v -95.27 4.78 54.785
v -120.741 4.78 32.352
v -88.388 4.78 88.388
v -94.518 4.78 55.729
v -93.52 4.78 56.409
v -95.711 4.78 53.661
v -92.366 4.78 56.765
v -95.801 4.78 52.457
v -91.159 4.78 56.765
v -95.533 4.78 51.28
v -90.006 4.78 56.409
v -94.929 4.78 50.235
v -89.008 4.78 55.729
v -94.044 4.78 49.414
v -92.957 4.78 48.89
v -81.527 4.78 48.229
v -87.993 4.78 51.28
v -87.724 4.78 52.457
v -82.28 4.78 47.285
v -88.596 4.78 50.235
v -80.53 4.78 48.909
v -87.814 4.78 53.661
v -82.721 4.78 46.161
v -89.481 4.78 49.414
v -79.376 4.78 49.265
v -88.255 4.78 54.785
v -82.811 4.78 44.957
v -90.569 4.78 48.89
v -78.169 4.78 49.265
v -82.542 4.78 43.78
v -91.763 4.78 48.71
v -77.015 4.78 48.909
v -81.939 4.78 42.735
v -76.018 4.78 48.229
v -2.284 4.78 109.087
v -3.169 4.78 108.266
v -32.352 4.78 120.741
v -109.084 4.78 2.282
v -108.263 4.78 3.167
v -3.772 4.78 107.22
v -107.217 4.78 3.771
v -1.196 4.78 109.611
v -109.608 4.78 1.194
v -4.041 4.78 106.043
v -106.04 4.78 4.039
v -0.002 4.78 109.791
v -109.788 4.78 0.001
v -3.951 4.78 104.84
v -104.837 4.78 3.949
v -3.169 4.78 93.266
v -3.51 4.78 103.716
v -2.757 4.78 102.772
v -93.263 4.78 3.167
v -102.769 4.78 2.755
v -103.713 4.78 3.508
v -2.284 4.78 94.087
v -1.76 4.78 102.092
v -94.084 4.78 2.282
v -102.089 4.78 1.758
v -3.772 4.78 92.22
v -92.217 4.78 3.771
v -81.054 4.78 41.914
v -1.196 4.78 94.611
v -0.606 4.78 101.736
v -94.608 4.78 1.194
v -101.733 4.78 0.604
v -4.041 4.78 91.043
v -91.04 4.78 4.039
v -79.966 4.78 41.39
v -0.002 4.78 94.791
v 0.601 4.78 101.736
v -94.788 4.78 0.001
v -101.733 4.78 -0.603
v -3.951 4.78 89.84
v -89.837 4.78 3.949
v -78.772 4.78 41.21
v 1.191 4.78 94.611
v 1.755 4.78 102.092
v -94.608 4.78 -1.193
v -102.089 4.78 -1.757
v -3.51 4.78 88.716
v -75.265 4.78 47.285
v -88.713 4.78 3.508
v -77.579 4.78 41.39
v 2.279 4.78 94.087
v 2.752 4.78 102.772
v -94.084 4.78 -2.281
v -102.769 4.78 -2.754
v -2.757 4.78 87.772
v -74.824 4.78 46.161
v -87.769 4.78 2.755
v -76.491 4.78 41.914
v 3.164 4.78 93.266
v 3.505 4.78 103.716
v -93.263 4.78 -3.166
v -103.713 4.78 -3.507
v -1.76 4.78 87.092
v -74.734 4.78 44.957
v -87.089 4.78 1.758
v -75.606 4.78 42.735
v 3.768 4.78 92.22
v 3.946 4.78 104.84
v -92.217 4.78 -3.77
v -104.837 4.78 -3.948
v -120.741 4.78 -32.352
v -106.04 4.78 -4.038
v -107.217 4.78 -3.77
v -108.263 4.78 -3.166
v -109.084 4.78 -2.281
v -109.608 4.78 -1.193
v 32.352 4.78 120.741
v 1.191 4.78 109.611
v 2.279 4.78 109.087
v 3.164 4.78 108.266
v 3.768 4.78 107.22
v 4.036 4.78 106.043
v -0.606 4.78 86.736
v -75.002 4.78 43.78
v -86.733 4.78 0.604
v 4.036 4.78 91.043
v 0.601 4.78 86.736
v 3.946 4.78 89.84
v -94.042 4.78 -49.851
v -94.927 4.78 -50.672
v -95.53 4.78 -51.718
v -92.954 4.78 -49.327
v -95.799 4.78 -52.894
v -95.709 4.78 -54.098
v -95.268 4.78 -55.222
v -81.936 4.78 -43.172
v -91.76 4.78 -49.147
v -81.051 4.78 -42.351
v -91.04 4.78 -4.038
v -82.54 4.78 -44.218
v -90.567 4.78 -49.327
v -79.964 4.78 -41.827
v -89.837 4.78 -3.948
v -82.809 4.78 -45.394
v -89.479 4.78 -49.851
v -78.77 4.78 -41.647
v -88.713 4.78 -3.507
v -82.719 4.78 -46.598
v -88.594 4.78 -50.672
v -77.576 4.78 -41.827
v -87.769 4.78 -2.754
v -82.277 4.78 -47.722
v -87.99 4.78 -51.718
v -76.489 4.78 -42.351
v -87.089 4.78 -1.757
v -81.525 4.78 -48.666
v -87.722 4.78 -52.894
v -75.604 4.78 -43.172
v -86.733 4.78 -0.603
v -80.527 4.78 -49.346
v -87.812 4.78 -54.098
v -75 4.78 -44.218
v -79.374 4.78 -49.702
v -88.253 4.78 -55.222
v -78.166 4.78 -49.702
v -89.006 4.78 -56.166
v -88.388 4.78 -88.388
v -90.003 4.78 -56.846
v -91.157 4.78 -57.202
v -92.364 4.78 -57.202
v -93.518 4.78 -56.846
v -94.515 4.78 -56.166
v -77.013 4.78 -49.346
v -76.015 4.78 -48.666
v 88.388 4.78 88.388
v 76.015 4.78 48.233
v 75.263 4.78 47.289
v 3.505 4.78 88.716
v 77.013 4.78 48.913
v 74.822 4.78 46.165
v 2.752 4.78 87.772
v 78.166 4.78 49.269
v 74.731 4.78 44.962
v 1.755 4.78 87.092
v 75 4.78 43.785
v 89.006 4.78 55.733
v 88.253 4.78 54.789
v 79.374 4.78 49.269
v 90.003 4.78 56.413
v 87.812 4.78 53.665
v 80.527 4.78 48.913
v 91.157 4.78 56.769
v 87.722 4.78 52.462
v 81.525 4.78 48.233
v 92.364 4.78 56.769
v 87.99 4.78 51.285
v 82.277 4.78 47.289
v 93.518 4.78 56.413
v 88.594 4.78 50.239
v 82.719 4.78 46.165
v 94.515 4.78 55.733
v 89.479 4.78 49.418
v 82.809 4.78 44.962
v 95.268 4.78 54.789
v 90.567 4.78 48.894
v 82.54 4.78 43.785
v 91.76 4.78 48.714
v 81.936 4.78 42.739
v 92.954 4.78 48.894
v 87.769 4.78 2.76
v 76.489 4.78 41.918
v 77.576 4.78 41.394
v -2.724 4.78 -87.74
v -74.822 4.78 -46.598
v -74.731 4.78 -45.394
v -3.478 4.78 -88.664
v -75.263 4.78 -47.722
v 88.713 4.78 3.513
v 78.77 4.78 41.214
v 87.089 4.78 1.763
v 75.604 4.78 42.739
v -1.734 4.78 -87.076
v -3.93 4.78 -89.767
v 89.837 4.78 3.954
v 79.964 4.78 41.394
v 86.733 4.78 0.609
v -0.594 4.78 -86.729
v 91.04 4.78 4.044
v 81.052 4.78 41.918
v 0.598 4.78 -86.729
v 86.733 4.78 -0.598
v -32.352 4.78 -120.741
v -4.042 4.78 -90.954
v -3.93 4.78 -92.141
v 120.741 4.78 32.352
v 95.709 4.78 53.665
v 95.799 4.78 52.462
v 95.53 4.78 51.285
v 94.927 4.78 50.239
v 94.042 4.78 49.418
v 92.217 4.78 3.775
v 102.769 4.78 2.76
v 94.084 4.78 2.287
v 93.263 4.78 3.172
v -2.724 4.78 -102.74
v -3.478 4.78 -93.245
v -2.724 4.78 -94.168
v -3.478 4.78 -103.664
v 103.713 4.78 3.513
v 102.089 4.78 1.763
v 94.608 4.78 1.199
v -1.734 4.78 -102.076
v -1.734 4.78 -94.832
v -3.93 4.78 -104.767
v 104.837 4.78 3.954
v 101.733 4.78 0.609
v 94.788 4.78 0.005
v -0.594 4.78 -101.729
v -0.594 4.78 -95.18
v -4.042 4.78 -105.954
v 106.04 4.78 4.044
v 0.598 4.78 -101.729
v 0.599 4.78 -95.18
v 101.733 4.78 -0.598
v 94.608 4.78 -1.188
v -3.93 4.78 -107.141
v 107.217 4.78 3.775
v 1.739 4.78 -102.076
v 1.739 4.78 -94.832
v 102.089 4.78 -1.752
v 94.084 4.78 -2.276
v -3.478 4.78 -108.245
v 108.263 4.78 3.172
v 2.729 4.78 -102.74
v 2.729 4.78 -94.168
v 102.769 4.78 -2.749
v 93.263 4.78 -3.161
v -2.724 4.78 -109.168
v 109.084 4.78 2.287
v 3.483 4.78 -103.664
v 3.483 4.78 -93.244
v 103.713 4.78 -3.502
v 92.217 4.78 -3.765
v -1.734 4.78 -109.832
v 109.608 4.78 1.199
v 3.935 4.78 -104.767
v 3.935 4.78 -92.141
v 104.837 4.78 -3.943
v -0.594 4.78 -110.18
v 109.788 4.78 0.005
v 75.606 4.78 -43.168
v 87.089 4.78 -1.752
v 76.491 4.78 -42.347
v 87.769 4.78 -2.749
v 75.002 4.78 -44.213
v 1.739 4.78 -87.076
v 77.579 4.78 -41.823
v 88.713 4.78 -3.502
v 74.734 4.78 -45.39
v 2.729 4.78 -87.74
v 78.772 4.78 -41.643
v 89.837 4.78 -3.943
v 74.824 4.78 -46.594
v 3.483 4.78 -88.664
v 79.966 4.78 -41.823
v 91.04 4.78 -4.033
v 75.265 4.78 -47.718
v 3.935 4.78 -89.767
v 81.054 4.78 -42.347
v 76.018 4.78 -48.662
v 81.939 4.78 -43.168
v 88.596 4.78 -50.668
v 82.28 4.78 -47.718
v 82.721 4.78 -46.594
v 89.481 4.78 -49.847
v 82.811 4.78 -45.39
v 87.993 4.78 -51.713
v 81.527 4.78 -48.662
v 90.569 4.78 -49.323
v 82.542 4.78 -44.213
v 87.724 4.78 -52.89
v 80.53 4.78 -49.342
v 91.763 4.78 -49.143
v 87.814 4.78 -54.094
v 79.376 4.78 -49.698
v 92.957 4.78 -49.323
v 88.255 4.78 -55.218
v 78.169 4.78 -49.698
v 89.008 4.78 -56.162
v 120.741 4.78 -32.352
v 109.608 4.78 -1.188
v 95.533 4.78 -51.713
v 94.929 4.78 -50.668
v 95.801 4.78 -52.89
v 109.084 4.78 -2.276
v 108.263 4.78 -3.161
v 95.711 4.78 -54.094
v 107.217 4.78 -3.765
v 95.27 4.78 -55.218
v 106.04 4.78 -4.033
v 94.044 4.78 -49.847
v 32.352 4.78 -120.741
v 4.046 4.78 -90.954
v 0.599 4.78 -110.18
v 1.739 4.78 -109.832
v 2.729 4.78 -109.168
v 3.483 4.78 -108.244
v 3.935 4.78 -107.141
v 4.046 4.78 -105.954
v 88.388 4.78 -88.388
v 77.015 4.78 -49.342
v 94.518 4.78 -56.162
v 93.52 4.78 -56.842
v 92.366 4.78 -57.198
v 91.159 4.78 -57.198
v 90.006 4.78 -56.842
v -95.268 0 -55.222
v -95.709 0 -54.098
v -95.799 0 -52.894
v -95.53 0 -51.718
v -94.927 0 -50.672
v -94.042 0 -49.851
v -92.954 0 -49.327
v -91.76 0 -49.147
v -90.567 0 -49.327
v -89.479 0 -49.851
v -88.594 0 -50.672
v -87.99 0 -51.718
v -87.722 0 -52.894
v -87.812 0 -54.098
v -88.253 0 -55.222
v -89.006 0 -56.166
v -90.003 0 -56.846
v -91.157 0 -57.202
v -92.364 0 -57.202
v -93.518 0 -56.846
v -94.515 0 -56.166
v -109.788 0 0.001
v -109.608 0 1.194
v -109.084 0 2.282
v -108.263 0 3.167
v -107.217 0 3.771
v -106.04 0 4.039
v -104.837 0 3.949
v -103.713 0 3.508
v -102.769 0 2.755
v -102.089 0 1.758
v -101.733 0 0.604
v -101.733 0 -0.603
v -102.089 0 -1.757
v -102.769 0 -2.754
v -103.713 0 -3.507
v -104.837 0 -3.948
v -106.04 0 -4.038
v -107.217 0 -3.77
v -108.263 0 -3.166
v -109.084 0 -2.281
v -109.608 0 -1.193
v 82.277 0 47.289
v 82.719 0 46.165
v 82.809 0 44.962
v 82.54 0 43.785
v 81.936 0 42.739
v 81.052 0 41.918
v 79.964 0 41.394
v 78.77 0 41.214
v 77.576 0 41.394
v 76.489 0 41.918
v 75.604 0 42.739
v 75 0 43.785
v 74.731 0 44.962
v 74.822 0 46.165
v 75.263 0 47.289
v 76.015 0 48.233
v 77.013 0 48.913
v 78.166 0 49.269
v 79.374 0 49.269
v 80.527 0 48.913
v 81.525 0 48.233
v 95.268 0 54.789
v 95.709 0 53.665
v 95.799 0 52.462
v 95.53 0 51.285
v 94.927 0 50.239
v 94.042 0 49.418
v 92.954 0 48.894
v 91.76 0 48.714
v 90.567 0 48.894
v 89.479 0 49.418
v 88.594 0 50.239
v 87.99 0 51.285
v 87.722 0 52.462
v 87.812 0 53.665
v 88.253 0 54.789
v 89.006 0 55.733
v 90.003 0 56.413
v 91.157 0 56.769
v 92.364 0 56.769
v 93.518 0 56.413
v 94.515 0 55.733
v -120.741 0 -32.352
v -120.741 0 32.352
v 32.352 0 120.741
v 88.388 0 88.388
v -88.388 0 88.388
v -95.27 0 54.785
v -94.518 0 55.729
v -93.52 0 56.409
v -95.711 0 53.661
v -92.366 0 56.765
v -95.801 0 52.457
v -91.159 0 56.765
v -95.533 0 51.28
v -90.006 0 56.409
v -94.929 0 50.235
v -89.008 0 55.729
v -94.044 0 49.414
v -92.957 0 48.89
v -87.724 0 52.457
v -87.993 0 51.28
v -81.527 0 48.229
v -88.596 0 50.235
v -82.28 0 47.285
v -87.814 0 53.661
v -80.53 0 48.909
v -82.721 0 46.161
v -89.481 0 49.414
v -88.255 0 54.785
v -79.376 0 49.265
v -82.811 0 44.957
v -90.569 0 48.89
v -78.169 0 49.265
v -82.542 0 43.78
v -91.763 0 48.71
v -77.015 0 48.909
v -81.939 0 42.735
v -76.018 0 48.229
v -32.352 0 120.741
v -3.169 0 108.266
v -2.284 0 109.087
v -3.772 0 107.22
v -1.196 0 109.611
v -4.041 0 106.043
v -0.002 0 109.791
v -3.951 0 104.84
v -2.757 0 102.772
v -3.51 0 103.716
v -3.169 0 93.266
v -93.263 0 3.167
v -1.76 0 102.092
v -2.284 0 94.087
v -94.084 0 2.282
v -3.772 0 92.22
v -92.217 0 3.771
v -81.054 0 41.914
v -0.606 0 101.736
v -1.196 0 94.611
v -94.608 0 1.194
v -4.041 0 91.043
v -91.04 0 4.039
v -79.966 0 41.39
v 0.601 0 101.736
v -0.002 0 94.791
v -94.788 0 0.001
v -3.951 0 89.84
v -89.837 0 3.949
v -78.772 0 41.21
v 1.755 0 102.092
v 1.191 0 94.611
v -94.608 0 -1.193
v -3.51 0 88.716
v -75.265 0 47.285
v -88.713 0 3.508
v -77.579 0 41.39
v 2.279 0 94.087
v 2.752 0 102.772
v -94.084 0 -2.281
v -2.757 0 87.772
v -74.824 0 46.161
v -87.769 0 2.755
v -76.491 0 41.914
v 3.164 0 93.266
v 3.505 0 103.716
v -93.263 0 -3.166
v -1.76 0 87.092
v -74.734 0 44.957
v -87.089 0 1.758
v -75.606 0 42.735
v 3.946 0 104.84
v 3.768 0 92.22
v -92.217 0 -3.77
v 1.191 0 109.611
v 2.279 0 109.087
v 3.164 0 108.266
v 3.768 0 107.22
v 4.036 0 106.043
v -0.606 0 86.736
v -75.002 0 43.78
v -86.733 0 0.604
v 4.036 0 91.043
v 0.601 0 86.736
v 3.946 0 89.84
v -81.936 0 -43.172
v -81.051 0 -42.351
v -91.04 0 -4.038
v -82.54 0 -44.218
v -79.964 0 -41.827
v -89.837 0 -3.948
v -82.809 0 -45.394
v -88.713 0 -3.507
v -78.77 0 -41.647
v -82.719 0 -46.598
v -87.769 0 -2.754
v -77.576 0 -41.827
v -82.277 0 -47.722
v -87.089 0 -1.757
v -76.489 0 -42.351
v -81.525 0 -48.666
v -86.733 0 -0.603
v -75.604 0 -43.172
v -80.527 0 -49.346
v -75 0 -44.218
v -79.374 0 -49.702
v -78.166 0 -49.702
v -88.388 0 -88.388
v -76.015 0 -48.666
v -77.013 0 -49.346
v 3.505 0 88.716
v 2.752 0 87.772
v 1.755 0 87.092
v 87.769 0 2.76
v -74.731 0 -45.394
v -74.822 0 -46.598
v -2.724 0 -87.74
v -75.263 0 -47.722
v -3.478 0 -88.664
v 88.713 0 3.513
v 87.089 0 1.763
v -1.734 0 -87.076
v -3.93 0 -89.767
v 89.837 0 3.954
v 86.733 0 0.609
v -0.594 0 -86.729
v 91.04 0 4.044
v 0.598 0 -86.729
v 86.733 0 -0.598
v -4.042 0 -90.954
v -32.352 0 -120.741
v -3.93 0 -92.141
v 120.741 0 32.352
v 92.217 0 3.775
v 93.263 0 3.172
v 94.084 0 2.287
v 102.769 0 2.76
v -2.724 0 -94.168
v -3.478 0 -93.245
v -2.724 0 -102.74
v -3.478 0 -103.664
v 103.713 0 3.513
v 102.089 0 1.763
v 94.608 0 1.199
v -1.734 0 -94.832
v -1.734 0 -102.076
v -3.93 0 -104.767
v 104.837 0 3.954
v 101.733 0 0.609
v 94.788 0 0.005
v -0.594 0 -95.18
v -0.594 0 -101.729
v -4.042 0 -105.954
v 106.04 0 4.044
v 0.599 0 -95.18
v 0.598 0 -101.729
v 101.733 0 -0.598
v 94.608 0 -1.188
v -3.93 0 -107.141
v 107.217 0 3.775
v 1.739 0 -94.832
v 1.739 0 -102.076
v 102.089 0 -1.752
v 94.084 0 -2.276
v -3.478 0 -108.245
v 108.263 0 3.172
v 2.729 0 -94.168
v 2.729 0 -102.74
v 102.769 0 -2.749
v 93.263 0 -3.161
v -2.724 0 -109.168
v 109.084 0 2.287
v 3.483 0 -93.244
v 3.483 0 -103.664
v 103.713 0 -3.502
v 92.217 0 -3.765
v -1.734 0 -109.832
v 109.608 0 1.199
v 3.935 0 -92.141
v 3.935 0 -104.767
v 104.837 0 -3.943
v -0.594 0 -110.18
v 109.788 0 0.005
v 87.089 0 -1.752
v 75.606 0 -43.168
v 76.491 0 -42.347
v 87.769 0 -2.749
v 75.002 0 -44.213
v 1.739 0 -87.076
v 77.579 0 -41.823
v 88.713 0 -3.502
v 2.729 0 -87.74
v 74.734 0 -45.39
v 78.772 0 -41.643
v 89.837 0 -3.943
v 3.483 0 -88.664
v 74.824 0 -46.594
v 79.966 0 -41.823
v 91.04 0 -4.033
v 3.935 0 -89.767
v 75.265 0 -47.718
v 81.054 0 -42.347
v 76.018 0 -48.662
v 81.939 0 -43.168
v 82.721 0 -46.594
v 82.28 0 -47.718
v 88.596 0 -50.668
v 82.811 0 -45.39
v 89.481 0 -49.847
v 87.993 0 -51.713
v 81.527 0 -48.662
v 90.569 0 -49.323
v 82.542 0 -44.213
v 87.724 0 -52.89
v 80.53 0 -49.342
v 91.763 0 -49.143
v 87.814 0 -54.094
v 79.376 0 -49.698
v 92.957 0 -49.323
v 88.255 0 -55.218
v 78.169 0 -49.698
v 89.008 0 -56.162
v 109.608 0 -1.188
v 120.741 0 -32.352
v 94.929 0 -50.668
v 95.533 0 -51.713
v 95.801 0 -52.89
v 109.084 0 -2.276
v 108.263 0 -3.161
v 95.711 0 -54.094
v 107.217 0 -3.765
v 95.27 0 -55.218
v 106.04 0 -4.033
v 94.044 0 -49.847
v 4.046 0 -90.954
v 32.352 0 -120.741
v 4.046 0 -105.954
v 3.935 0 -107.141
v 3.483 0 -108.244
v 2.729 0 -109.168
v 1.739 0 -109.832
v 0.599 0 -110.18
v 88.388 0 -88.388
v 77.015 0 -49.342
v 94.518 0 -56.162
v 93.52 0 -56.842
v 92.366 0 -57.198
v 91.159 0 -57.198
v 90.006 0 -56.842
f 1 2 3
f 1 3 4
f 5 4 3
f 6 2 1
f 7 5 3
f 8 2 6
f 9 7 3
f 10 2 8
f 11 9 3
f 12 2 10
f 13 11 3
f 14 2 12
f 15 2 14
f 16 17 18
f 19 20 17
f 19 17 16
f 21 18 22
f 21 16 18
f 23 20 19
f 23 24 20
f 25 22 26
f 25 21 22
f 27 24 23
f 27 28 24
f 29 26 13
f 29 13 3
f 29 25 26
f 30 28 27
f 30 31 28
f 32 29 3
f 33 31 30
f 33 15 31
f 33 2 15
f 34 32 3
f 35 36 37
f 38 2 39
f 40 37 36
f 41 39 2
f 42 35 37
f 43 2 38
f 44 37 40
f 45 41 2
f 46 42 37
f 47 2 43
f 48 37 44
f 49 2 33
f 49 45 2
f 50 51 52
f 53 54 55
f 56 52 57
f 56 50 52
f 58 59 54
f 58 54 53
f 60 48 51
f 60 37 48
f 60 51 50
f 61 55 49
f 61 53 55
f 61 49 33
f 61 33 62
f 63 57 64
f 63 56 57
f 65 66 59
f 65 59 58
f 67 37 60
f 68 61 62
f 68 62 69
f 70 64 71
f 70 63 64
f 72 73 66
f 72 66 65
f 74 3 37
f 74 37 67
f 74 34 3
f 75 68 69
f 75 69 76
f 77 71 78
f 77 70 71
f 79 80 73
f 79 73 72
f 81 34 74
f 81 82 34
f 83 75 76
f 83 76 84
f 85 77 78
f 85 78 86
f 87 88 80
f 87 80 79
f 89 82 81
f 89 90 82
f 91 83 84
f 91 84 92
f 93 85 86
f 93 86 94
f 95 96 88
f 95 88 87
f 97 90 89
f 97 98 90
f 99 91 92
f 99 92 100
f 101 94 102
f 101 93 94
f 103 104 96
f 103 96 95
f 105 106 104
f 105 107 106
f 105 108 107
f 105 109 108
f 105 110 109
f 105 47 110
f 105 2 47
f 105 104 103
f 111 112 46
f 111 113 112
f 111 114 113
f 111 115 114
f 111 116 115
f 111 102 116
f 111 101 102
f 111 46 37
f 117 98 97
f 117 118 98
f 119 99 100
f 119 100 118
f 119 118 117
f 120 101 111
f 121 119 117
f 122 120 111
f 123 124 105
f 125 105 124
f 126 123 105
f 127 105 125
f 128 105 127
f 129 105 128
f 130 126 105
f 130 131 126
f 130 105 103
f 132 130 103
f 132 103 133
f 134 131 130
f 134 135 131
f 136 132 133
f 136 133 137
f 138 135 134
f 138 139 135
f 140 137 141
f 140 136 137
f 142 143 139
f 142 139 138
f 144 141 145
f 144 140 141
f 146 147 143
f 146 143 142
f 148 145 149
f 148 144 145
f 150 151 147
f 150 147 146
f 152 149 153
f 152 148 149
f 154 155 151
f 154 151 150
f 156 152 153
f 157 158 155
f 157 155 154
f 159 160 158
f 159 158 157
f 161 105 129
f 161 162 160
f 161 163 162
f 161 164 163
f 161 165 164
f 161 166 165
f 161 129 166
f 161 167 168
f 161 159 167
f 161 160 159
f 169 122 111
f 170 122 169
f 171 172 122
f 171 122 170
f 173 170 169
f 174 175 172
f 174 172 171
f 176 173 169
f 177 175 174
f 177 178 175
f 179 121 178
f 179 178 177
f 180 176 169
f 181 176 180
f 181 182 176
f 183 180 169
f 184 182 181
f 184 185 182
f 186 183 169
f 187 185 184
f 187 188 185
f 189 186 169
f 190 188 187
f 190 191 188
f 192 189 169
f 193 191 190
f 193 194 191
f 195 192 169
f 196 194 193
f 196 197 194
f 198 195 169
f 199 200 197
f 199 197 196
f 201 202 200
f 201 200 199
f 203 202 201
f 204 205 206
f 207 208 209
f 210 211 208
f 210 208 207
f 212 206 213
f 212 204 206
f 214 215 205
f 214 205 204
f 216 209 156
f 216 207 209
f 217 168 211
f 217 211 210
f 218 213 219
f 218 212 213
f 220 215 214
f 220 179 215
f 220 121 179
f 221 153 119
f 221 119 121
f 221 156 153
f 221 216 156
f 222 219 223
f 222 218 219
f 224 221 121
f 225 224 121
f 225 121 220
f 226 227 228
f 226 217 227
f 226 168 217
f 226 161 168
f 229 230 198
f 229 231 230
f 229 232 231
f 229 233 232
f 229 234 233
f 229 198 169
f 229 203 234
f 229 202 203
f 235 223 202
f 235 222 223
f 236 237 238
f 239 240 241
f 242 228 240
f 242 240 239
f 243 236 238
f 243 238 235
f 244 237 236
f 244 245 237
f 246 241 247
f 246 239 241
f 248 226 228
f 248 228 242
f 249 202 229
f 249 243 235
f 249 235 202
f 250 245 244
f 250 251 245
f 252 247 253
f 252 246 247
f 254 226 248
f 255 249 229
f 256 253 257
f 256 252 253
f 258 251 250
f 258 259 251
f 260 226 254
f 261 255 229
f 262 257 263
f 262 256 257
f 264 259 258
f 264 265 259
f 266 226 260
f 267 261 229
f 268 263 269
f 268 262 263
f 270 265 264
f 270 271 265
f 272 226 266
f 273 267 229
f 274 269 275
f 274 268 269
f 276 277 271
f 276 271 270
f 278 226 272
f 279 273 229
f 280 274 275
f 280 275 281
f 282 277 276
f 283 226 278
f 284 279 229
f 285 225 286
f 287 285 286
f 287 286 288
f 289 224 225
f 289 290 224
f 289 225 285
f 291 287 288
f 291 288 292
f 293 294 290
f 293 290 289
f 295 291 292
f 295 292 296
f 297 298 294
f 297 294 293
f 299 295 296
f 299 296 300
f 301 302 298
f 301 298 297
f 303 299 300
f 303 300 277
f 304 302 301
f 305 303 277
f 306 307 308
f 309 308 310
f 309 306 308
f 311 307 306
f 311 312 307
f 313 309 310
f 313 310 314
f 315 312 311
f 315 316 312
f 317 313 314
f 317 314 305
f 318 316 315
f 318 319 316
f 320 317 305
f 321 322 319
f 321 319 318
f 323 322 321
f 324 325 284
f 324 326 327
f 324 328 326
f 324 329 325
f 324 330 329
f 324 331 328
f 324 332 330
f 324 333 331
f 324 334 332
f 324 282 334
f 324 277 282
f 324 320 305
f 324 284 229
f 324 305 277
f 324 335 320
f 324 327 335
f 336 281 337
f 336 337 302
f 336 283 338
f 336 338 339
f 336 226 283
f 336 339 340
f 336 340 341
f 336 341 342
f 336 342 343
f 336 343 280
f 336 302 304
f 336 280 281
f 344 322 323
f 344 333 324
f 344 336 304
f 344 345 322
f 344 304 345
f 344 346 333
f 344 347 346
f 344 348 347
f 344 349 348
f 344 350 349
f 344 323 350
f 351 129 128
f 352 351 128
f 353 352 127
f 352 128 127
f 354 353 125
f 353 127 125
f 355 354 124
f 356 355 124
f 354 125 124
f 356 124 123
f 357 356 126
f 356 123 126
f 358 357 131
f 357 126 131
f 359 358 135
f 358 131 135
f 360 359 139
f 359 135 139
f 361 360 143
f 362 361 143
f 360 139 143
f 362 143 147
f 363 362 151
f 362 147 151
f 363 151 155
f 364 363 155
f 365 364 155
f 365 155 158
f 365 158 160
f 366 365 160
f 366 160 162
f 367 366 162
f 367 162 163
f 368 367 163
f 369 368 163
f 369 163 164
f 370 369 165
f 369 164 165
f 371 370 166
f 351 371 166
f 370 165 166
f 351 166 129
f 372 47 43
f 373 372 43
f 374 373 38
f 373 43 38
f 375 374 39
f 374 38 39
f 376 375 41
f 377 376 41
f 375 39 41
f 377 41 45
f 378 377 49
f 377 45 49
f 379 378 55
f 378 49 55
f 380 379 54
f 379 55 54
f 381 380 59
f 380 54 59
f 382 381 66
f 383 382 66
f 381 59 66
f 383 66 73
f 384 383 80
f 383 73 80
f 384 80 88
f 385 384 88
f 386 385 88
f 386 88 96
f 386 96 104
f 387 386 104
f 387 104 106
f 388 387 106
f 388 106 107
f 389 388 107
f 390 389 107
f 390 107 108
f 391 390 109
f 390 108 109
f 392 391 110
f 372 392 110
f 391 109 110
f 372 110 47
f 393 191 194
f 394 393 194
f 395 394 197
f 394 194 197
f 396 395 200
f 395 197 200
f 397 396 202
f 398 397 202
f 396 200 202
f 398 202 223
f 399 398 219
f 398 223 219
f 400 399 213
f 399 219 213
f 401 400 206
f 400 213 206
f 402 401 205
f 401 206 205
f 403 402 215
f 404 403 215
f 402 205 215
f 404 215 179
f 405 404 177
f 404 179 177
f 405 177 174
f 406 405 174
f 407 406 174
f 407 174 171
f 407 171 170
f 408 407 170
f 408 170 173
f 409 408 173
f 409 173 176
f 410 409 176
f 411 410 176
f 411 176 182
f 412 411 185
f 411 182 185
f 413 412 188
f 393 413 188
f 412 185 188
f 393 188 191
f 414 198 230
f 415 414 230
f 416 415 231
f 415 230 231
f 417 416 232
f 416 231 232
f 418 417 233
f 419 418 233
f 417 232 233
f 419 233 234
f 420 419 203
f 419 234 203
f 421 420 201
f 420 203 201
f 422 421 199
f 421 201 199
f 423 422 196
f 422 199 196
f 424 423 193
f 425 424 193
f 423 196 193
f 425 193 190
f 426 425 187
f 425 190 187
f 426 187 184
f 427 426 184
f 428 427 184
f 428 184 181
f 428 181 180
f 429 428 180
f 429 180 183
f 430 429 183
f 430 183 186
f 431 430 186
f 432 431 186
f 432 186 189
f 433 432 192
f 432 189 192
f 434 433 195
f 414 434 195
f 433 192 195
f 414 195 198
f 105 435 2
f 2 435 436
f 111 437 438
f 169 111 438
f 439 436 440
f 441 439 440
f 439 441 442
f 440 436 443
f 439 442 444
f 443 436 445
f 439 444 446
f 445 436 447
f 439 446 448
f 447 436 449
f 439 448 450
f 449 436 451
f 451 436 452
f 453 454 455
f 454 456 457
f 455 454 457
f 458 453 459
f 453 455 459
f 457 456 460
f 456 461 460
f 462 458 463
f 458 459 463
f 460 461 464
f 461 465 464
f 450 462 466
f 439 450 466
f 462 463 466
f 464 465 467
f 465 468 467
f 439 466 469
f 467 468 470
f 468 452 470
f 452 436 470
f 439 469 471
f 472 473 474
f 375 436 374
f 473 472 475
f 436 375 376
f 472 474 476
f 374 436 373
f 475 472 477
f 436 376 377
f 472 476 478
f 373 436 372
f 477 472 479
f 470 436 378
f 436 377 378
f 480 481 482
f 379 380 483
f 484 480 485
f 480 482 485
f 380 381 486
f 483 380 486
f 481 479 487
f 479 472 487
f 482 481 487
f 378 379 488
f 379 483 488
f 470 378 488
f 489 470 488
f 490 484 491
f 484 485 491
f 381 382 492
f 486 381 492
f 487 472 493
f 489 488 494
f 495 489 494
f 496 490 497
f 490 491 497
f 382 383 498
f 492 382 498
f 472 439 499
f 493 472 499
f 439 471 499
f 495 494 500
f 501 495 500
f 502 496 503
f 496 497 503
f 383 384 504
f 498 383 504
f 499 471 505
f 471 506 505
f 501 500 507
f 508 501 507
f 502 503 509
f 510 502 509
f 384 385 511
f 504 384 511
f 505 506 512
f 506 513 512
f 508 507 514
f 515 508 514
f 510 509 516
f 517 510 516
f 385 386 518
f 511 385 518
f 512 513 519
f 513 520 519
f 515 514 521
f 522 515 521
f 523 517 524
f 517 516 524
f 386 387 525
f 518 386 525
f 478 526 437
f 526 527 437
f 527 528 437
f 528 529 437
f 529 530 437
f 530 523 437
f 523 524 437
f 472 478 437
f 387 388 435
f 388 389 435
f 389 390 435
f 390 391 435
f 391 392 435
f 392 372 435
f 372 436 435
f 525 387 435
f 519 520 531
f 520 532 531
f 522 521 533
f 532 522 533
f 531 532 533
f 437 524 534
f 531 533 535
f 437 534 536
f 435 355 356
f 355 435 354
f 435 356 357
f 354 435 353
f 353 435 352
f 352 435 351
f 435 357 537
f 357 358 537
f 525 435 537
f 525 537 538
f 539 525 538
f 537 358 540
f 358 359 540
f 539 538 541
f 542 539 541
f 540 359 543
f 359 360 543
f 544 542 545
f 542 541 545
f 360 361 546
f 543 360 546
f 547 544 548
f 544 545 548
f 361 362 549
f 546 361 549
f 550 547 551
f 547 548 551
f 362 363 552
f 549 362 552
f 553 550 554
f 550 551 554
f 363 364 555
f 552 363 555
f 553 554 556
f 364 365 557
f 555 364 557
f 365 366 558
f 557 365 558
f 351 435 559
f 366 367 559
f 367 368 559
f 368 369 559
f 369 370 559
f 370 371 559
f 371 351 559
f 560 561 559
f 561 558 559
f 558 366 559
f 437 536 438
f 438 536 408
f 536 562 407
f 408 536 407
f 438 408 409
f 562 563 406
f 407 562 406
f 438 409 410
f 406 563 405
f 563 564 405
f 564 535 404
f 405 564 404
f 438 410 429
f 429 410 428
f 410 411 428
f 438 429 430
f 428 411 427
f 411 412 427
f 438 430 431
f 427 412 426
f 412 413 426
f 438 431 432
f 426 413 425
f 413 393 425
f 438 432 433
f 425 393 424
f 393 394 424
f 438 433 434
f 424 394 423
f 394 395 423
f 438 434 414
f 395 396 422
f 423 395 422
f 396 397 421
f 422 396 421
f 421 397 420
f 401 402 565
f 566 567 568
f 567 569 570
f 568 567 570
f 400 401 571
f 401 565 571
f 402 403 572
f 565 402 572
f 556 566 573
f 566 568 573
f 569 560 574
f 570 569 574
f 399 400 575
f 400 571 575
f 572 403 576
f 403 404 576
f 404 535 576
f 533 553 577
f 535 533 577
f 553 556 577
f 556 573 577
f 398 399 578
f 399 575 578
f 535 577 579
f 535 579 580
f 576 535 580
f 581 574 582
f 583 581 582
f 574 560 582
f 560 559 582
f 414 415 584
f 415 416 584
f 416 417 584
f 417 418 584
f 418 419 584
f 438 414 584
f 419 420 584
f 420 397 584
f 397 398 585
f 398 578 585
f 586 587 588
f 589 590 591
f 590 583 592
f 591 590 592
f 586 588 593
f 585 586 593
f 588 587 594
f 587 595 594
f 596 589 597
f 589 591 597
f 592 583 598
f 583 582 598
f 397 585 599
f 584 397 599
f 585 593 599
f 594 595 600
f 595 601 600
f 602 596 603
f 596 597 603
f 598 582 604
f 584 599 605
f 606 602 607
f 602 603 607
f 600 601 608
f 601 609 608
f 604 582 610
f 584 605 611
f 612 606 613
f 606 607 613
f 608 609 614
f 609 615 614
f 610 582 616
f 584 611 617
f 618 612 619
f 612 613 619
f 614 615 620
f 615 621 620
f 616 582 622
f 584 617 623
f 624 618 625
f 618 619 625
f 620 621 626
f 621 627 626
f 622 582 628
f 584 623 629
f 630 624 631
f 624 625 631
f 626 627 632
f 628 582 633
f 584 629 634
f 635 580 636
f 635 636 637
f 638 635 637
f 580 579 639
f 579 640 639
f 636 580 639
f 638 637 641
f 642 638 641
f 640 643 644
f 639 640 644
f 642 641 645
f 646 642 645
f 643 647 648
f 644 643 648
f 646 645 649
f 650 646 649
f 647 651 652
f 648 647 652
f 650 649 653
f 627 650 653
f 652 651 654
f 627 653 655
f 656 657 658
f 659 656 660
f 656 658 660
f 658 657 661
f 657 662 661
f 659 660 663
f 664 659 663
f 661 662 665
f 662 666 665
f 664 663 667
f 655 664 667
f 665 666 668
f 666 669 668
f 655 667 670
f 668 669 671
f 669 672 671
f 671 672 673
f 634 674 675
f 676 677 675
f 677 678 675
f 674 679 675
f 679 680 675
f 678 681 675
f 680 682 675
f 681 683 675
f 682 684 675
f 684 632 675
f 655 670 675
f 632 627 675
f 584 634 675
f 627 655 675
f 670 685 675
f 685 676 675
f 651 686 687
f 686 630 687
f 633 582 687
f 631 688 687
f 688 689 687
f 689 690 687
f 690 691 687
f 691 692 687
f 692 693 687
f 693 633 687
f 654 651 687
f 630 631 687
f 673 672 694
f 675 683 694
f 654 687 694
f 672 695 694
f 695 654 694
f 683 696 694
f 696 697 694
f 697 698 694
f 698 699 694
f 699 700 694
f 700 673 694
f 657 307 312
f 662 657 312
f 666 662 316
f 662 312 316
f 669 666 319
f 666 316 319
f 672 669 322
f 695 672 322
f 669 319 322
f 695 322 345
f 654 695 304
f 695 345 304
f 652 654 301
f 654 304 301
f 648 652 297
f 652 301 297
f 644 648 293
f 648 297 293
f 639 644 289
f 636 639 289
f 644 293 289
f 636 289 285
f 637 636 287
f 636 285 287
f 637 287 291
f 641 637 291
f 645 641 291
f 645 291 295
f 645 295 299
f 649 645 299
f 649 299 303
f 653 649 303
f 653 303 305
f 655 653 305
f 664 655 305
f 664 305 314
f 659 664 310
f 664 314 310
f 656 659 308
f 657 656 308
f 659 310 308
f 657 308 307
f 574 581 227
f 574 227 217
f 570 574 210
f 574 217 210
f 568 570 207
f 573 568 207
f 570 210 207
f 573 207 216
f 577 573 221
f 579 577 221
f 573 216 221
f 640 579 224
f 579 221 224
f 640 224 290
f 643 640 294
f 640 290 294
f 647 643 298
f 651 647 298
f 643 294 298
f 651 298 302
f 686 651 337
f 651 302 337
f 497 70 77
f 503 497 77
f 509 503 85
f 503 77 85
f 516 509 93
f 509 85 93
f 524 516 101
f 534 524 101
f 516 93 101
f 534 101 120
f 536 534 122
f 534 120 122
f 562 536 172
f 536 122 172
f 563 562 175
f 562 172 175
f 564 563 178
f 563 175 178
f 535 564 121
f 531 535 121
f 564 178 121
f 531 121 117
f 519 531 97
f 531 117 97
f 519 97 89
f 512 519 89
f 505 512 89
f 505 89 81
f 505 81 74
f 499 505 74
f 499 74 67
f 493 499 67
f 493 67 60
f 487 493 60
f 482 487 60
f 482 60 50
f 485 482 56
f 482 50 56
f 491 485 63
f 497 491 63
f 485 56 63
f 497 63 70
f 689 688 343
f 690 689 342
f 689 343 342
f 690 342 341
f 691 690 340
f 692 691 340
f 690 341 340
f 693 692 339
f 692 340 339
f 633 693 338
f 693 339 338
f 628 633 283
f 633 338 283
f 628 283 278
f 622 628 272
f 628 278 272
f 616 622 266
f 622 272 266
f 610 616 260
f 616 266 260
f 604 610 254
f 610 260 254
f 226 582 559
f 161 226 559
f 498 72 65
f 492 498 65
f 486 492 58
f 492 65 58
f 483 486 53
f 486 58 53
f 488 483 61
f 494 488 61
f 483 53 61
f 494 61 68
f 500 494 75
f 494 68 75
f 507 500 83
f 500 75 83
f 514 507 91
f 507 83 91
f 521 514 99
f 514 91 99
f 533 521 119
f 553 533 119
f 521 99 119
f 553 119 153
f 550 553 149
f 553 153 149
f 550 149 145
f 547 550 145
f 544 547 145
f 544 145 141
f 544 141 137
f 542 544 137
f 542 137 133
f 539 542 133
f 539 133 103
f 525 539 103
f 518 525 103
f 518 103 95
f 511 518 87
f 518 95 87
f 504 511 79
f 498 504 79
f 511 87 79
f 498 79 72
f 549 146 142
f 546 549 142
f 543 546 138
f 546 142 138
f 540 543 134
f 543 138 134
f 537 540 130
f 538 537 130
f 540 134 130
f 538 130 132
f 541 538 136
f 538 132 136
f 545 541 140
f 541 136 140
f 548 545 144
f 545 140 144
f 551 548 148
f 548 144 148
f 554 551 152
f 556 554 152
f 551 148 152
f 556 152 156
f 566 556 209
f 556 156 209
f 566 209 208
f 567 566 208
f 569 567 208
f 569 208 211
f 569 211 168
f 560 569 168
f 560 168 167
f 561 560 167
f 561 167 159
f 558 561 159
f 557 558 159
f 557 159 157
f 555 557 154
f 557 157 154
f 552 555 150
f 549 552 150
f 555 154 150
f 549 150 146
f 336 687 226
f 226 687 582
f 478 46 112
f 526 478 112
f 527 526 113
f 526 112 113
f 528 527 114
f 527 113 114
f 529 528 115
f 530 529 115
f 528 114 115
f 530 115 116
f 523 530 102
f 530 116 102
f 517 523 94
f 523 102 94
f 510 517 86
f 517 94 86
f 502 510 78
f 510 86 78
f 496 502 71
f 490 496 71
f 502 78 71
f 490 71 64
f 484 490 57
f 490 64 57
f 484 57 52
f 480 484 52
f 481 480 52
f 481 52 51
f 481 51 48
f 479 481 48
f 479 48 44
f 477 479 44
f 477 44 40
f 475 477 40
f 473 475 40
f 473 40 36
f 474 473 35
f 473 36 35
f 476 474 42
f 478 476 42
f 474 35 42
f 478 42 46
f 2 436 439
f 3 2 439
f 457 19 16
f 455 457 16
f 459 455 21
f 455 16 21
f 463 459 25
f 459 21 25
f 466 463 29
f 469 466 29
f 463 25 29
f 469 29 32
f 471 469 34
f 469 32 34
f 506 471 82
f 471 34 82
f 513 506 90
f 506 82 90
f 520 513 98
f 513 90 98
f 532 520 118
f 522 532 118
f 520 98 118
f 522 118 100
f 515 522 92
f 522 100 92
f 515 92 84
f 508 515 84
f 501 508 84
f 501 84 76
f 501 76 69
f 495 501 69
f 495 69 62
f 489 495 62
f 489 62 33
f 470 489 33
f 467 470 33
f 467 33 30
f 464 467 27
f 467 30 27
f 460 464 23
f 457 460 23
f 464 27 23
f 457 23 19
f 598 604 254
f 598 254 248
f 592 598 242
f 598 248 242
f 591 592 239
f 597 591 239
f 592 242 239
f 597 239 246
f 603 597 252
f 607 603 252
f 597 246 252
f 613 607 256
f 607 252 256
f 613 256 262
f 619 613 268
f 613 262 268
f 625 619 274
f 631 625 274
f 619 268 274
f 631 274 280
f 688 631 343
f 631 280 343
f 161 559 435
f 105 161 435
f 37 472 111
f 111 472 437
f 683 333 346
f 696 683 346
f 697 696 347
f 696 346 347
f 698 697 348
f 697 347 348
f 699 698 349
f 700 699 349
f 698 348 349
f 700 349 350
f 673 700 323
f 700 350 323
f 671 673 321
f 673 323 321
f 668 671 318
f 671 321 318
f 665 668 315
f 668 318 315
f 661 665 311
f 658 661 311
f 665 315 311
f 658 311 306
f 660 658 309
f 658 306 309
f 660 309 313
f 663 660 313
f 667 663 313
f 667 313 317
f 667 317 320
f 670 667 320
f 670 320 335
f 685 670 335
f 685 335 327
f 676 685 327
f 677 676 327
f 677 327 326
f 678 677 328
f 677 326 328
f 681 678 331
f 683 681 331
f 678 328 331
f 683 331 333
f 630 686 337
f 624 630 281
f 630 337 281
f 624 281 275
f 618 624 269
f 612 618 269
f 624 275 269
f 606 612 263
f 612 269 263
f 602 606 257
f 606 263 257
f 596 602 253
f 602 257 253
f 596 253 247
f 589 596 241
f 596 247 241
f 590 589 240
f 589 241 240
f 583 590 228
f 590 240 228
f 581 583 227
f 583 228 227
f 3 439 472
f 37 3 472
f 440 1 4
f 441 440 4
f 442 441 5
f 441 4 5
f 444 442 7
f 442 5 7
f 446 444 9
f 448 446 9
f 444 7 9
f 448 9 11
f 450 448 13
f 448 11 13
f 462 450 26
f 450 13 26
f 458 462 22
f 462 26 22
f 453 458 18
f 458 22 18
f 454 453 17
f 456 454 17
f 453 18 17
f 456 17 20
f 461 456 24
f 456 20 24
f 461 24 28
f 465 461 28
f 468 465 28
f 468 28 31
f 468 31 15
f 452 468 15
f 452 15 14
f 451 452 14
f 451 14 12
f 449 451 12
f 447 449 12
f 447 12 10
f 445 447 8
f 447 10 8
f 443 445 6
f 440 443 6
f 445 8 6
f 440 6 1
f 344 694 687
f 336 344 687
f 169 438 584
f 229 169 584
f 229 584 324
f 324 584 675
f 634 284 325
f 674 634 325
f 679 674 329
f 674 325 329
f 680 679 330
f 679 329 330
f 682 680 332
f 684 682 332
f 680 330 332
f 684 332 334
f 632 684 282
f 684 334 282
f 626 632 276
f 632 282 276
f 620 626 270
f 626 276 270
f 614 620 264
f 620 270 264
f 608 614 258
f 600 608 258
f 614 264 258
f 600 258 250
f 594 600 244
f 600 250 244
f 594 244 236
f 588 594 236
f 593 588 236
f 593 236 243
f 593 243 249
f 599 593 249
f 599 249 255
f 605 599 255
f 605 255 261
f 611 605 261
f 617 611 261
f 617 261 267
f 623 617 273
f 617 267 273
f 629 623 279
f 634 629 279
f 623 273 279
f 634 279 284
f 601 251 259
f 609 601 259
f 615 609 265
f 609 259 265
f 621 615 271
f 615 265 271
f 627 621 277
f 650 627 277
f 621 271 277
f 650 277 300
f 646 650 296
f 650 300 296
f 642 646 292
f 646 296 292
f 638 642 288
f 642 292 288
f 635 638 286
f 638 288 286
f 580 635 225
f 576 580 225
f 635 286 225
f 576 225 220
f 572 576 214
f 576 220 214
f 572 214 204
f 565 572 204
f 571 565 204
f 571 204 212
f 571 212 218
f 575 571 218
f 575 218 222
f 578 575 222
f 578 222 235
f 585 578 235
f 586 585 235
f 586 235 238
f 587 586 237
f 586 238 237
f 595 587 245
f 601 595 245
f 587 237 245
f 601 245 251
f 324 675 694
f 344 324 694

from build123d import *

# Parameters (mm, degrees)
BOSS_EXTRUDE1_DEPTH = 4.78
SKETCH3_R           = 4.05
CUT_EXTRUDE1_DEPTH  = 4.78
CIRPATTERN1_COUNT   = 6
CIRPATTERN3_COUNT   = 4


with BuildPart() as part:
    # Sketch2 → Boss-Extrude1 (new body)
    with BuildSketch(Plane(origin=(0, 0, 0), x_dir=(1, 0, 0), z_dir=(0, 1, 0))):
        Polygon((120.740728286, 32.352380638), (88.388347648, 88.388347648), (32.352380638, 120.740728286), (-32.352380638, 120.740728286), (-88.388347648, 88.388347648), (-120.740728286, 32.352380638), (-120.740728286, -32.352380638), (-88.388347648, -88.388347648), (-32.352380638, -120.740728286), (32.352380638, -120.740728286), (88.388347648, -88.388347648), (120.740728286, -32.352380638), align=None)
    extrude(amount=BOSS_EXTRUDE1_DEPTH)

    # Sketch3 → Cut-Extrude1 (cut)
    with BuildSketch(Plane(origin=(0, 4.78, 0), x_dir=(1, 0, 0), z_dir=(0, 1, 0))):
        with Locations(Location((-0.002380638, -105.740728286, 0), (0, 0, 270))):
            Circle(SKETCH3_R)
        with Locations(Location((-0.002380638, -90.740728286, 0), (0, 0, 270))):
            Circle(SKETCH3_R)
    cut_extrude1 = extrude(amount=-CUT_EXTRUDE1_DEPTH, mode=Mode.SUBTRACT)

    # CirPattern1: Cut-Extrude1 ×6 about axis
    cirpattern1_axis = Axis((5.246e-06, 0, -0.216469196), (0, 1, 0))
    for i in range(1, CIRPATTERN1_COUNT):
        add(cut_extrude1.rotate(cirpattern1_axis, i * 360 / CIRPATTERN1_COUNT), mode=Mode.SUBTRACT)

    # CirPattern3: Cut-Extrude1 ×4 about axis
    cirpattern3_axis = Axis((-7e-08, 0, 0.002893764), (0, 1, 0))
    for i in range(1, CIRPATTERN3_COUNT):
        add(cut_extrude1.rotate(cirpattern3_axis, i * 360 / CIRPATTERN3_COUNT), mode=Mode.SUBTRACT)


solid = part.part
